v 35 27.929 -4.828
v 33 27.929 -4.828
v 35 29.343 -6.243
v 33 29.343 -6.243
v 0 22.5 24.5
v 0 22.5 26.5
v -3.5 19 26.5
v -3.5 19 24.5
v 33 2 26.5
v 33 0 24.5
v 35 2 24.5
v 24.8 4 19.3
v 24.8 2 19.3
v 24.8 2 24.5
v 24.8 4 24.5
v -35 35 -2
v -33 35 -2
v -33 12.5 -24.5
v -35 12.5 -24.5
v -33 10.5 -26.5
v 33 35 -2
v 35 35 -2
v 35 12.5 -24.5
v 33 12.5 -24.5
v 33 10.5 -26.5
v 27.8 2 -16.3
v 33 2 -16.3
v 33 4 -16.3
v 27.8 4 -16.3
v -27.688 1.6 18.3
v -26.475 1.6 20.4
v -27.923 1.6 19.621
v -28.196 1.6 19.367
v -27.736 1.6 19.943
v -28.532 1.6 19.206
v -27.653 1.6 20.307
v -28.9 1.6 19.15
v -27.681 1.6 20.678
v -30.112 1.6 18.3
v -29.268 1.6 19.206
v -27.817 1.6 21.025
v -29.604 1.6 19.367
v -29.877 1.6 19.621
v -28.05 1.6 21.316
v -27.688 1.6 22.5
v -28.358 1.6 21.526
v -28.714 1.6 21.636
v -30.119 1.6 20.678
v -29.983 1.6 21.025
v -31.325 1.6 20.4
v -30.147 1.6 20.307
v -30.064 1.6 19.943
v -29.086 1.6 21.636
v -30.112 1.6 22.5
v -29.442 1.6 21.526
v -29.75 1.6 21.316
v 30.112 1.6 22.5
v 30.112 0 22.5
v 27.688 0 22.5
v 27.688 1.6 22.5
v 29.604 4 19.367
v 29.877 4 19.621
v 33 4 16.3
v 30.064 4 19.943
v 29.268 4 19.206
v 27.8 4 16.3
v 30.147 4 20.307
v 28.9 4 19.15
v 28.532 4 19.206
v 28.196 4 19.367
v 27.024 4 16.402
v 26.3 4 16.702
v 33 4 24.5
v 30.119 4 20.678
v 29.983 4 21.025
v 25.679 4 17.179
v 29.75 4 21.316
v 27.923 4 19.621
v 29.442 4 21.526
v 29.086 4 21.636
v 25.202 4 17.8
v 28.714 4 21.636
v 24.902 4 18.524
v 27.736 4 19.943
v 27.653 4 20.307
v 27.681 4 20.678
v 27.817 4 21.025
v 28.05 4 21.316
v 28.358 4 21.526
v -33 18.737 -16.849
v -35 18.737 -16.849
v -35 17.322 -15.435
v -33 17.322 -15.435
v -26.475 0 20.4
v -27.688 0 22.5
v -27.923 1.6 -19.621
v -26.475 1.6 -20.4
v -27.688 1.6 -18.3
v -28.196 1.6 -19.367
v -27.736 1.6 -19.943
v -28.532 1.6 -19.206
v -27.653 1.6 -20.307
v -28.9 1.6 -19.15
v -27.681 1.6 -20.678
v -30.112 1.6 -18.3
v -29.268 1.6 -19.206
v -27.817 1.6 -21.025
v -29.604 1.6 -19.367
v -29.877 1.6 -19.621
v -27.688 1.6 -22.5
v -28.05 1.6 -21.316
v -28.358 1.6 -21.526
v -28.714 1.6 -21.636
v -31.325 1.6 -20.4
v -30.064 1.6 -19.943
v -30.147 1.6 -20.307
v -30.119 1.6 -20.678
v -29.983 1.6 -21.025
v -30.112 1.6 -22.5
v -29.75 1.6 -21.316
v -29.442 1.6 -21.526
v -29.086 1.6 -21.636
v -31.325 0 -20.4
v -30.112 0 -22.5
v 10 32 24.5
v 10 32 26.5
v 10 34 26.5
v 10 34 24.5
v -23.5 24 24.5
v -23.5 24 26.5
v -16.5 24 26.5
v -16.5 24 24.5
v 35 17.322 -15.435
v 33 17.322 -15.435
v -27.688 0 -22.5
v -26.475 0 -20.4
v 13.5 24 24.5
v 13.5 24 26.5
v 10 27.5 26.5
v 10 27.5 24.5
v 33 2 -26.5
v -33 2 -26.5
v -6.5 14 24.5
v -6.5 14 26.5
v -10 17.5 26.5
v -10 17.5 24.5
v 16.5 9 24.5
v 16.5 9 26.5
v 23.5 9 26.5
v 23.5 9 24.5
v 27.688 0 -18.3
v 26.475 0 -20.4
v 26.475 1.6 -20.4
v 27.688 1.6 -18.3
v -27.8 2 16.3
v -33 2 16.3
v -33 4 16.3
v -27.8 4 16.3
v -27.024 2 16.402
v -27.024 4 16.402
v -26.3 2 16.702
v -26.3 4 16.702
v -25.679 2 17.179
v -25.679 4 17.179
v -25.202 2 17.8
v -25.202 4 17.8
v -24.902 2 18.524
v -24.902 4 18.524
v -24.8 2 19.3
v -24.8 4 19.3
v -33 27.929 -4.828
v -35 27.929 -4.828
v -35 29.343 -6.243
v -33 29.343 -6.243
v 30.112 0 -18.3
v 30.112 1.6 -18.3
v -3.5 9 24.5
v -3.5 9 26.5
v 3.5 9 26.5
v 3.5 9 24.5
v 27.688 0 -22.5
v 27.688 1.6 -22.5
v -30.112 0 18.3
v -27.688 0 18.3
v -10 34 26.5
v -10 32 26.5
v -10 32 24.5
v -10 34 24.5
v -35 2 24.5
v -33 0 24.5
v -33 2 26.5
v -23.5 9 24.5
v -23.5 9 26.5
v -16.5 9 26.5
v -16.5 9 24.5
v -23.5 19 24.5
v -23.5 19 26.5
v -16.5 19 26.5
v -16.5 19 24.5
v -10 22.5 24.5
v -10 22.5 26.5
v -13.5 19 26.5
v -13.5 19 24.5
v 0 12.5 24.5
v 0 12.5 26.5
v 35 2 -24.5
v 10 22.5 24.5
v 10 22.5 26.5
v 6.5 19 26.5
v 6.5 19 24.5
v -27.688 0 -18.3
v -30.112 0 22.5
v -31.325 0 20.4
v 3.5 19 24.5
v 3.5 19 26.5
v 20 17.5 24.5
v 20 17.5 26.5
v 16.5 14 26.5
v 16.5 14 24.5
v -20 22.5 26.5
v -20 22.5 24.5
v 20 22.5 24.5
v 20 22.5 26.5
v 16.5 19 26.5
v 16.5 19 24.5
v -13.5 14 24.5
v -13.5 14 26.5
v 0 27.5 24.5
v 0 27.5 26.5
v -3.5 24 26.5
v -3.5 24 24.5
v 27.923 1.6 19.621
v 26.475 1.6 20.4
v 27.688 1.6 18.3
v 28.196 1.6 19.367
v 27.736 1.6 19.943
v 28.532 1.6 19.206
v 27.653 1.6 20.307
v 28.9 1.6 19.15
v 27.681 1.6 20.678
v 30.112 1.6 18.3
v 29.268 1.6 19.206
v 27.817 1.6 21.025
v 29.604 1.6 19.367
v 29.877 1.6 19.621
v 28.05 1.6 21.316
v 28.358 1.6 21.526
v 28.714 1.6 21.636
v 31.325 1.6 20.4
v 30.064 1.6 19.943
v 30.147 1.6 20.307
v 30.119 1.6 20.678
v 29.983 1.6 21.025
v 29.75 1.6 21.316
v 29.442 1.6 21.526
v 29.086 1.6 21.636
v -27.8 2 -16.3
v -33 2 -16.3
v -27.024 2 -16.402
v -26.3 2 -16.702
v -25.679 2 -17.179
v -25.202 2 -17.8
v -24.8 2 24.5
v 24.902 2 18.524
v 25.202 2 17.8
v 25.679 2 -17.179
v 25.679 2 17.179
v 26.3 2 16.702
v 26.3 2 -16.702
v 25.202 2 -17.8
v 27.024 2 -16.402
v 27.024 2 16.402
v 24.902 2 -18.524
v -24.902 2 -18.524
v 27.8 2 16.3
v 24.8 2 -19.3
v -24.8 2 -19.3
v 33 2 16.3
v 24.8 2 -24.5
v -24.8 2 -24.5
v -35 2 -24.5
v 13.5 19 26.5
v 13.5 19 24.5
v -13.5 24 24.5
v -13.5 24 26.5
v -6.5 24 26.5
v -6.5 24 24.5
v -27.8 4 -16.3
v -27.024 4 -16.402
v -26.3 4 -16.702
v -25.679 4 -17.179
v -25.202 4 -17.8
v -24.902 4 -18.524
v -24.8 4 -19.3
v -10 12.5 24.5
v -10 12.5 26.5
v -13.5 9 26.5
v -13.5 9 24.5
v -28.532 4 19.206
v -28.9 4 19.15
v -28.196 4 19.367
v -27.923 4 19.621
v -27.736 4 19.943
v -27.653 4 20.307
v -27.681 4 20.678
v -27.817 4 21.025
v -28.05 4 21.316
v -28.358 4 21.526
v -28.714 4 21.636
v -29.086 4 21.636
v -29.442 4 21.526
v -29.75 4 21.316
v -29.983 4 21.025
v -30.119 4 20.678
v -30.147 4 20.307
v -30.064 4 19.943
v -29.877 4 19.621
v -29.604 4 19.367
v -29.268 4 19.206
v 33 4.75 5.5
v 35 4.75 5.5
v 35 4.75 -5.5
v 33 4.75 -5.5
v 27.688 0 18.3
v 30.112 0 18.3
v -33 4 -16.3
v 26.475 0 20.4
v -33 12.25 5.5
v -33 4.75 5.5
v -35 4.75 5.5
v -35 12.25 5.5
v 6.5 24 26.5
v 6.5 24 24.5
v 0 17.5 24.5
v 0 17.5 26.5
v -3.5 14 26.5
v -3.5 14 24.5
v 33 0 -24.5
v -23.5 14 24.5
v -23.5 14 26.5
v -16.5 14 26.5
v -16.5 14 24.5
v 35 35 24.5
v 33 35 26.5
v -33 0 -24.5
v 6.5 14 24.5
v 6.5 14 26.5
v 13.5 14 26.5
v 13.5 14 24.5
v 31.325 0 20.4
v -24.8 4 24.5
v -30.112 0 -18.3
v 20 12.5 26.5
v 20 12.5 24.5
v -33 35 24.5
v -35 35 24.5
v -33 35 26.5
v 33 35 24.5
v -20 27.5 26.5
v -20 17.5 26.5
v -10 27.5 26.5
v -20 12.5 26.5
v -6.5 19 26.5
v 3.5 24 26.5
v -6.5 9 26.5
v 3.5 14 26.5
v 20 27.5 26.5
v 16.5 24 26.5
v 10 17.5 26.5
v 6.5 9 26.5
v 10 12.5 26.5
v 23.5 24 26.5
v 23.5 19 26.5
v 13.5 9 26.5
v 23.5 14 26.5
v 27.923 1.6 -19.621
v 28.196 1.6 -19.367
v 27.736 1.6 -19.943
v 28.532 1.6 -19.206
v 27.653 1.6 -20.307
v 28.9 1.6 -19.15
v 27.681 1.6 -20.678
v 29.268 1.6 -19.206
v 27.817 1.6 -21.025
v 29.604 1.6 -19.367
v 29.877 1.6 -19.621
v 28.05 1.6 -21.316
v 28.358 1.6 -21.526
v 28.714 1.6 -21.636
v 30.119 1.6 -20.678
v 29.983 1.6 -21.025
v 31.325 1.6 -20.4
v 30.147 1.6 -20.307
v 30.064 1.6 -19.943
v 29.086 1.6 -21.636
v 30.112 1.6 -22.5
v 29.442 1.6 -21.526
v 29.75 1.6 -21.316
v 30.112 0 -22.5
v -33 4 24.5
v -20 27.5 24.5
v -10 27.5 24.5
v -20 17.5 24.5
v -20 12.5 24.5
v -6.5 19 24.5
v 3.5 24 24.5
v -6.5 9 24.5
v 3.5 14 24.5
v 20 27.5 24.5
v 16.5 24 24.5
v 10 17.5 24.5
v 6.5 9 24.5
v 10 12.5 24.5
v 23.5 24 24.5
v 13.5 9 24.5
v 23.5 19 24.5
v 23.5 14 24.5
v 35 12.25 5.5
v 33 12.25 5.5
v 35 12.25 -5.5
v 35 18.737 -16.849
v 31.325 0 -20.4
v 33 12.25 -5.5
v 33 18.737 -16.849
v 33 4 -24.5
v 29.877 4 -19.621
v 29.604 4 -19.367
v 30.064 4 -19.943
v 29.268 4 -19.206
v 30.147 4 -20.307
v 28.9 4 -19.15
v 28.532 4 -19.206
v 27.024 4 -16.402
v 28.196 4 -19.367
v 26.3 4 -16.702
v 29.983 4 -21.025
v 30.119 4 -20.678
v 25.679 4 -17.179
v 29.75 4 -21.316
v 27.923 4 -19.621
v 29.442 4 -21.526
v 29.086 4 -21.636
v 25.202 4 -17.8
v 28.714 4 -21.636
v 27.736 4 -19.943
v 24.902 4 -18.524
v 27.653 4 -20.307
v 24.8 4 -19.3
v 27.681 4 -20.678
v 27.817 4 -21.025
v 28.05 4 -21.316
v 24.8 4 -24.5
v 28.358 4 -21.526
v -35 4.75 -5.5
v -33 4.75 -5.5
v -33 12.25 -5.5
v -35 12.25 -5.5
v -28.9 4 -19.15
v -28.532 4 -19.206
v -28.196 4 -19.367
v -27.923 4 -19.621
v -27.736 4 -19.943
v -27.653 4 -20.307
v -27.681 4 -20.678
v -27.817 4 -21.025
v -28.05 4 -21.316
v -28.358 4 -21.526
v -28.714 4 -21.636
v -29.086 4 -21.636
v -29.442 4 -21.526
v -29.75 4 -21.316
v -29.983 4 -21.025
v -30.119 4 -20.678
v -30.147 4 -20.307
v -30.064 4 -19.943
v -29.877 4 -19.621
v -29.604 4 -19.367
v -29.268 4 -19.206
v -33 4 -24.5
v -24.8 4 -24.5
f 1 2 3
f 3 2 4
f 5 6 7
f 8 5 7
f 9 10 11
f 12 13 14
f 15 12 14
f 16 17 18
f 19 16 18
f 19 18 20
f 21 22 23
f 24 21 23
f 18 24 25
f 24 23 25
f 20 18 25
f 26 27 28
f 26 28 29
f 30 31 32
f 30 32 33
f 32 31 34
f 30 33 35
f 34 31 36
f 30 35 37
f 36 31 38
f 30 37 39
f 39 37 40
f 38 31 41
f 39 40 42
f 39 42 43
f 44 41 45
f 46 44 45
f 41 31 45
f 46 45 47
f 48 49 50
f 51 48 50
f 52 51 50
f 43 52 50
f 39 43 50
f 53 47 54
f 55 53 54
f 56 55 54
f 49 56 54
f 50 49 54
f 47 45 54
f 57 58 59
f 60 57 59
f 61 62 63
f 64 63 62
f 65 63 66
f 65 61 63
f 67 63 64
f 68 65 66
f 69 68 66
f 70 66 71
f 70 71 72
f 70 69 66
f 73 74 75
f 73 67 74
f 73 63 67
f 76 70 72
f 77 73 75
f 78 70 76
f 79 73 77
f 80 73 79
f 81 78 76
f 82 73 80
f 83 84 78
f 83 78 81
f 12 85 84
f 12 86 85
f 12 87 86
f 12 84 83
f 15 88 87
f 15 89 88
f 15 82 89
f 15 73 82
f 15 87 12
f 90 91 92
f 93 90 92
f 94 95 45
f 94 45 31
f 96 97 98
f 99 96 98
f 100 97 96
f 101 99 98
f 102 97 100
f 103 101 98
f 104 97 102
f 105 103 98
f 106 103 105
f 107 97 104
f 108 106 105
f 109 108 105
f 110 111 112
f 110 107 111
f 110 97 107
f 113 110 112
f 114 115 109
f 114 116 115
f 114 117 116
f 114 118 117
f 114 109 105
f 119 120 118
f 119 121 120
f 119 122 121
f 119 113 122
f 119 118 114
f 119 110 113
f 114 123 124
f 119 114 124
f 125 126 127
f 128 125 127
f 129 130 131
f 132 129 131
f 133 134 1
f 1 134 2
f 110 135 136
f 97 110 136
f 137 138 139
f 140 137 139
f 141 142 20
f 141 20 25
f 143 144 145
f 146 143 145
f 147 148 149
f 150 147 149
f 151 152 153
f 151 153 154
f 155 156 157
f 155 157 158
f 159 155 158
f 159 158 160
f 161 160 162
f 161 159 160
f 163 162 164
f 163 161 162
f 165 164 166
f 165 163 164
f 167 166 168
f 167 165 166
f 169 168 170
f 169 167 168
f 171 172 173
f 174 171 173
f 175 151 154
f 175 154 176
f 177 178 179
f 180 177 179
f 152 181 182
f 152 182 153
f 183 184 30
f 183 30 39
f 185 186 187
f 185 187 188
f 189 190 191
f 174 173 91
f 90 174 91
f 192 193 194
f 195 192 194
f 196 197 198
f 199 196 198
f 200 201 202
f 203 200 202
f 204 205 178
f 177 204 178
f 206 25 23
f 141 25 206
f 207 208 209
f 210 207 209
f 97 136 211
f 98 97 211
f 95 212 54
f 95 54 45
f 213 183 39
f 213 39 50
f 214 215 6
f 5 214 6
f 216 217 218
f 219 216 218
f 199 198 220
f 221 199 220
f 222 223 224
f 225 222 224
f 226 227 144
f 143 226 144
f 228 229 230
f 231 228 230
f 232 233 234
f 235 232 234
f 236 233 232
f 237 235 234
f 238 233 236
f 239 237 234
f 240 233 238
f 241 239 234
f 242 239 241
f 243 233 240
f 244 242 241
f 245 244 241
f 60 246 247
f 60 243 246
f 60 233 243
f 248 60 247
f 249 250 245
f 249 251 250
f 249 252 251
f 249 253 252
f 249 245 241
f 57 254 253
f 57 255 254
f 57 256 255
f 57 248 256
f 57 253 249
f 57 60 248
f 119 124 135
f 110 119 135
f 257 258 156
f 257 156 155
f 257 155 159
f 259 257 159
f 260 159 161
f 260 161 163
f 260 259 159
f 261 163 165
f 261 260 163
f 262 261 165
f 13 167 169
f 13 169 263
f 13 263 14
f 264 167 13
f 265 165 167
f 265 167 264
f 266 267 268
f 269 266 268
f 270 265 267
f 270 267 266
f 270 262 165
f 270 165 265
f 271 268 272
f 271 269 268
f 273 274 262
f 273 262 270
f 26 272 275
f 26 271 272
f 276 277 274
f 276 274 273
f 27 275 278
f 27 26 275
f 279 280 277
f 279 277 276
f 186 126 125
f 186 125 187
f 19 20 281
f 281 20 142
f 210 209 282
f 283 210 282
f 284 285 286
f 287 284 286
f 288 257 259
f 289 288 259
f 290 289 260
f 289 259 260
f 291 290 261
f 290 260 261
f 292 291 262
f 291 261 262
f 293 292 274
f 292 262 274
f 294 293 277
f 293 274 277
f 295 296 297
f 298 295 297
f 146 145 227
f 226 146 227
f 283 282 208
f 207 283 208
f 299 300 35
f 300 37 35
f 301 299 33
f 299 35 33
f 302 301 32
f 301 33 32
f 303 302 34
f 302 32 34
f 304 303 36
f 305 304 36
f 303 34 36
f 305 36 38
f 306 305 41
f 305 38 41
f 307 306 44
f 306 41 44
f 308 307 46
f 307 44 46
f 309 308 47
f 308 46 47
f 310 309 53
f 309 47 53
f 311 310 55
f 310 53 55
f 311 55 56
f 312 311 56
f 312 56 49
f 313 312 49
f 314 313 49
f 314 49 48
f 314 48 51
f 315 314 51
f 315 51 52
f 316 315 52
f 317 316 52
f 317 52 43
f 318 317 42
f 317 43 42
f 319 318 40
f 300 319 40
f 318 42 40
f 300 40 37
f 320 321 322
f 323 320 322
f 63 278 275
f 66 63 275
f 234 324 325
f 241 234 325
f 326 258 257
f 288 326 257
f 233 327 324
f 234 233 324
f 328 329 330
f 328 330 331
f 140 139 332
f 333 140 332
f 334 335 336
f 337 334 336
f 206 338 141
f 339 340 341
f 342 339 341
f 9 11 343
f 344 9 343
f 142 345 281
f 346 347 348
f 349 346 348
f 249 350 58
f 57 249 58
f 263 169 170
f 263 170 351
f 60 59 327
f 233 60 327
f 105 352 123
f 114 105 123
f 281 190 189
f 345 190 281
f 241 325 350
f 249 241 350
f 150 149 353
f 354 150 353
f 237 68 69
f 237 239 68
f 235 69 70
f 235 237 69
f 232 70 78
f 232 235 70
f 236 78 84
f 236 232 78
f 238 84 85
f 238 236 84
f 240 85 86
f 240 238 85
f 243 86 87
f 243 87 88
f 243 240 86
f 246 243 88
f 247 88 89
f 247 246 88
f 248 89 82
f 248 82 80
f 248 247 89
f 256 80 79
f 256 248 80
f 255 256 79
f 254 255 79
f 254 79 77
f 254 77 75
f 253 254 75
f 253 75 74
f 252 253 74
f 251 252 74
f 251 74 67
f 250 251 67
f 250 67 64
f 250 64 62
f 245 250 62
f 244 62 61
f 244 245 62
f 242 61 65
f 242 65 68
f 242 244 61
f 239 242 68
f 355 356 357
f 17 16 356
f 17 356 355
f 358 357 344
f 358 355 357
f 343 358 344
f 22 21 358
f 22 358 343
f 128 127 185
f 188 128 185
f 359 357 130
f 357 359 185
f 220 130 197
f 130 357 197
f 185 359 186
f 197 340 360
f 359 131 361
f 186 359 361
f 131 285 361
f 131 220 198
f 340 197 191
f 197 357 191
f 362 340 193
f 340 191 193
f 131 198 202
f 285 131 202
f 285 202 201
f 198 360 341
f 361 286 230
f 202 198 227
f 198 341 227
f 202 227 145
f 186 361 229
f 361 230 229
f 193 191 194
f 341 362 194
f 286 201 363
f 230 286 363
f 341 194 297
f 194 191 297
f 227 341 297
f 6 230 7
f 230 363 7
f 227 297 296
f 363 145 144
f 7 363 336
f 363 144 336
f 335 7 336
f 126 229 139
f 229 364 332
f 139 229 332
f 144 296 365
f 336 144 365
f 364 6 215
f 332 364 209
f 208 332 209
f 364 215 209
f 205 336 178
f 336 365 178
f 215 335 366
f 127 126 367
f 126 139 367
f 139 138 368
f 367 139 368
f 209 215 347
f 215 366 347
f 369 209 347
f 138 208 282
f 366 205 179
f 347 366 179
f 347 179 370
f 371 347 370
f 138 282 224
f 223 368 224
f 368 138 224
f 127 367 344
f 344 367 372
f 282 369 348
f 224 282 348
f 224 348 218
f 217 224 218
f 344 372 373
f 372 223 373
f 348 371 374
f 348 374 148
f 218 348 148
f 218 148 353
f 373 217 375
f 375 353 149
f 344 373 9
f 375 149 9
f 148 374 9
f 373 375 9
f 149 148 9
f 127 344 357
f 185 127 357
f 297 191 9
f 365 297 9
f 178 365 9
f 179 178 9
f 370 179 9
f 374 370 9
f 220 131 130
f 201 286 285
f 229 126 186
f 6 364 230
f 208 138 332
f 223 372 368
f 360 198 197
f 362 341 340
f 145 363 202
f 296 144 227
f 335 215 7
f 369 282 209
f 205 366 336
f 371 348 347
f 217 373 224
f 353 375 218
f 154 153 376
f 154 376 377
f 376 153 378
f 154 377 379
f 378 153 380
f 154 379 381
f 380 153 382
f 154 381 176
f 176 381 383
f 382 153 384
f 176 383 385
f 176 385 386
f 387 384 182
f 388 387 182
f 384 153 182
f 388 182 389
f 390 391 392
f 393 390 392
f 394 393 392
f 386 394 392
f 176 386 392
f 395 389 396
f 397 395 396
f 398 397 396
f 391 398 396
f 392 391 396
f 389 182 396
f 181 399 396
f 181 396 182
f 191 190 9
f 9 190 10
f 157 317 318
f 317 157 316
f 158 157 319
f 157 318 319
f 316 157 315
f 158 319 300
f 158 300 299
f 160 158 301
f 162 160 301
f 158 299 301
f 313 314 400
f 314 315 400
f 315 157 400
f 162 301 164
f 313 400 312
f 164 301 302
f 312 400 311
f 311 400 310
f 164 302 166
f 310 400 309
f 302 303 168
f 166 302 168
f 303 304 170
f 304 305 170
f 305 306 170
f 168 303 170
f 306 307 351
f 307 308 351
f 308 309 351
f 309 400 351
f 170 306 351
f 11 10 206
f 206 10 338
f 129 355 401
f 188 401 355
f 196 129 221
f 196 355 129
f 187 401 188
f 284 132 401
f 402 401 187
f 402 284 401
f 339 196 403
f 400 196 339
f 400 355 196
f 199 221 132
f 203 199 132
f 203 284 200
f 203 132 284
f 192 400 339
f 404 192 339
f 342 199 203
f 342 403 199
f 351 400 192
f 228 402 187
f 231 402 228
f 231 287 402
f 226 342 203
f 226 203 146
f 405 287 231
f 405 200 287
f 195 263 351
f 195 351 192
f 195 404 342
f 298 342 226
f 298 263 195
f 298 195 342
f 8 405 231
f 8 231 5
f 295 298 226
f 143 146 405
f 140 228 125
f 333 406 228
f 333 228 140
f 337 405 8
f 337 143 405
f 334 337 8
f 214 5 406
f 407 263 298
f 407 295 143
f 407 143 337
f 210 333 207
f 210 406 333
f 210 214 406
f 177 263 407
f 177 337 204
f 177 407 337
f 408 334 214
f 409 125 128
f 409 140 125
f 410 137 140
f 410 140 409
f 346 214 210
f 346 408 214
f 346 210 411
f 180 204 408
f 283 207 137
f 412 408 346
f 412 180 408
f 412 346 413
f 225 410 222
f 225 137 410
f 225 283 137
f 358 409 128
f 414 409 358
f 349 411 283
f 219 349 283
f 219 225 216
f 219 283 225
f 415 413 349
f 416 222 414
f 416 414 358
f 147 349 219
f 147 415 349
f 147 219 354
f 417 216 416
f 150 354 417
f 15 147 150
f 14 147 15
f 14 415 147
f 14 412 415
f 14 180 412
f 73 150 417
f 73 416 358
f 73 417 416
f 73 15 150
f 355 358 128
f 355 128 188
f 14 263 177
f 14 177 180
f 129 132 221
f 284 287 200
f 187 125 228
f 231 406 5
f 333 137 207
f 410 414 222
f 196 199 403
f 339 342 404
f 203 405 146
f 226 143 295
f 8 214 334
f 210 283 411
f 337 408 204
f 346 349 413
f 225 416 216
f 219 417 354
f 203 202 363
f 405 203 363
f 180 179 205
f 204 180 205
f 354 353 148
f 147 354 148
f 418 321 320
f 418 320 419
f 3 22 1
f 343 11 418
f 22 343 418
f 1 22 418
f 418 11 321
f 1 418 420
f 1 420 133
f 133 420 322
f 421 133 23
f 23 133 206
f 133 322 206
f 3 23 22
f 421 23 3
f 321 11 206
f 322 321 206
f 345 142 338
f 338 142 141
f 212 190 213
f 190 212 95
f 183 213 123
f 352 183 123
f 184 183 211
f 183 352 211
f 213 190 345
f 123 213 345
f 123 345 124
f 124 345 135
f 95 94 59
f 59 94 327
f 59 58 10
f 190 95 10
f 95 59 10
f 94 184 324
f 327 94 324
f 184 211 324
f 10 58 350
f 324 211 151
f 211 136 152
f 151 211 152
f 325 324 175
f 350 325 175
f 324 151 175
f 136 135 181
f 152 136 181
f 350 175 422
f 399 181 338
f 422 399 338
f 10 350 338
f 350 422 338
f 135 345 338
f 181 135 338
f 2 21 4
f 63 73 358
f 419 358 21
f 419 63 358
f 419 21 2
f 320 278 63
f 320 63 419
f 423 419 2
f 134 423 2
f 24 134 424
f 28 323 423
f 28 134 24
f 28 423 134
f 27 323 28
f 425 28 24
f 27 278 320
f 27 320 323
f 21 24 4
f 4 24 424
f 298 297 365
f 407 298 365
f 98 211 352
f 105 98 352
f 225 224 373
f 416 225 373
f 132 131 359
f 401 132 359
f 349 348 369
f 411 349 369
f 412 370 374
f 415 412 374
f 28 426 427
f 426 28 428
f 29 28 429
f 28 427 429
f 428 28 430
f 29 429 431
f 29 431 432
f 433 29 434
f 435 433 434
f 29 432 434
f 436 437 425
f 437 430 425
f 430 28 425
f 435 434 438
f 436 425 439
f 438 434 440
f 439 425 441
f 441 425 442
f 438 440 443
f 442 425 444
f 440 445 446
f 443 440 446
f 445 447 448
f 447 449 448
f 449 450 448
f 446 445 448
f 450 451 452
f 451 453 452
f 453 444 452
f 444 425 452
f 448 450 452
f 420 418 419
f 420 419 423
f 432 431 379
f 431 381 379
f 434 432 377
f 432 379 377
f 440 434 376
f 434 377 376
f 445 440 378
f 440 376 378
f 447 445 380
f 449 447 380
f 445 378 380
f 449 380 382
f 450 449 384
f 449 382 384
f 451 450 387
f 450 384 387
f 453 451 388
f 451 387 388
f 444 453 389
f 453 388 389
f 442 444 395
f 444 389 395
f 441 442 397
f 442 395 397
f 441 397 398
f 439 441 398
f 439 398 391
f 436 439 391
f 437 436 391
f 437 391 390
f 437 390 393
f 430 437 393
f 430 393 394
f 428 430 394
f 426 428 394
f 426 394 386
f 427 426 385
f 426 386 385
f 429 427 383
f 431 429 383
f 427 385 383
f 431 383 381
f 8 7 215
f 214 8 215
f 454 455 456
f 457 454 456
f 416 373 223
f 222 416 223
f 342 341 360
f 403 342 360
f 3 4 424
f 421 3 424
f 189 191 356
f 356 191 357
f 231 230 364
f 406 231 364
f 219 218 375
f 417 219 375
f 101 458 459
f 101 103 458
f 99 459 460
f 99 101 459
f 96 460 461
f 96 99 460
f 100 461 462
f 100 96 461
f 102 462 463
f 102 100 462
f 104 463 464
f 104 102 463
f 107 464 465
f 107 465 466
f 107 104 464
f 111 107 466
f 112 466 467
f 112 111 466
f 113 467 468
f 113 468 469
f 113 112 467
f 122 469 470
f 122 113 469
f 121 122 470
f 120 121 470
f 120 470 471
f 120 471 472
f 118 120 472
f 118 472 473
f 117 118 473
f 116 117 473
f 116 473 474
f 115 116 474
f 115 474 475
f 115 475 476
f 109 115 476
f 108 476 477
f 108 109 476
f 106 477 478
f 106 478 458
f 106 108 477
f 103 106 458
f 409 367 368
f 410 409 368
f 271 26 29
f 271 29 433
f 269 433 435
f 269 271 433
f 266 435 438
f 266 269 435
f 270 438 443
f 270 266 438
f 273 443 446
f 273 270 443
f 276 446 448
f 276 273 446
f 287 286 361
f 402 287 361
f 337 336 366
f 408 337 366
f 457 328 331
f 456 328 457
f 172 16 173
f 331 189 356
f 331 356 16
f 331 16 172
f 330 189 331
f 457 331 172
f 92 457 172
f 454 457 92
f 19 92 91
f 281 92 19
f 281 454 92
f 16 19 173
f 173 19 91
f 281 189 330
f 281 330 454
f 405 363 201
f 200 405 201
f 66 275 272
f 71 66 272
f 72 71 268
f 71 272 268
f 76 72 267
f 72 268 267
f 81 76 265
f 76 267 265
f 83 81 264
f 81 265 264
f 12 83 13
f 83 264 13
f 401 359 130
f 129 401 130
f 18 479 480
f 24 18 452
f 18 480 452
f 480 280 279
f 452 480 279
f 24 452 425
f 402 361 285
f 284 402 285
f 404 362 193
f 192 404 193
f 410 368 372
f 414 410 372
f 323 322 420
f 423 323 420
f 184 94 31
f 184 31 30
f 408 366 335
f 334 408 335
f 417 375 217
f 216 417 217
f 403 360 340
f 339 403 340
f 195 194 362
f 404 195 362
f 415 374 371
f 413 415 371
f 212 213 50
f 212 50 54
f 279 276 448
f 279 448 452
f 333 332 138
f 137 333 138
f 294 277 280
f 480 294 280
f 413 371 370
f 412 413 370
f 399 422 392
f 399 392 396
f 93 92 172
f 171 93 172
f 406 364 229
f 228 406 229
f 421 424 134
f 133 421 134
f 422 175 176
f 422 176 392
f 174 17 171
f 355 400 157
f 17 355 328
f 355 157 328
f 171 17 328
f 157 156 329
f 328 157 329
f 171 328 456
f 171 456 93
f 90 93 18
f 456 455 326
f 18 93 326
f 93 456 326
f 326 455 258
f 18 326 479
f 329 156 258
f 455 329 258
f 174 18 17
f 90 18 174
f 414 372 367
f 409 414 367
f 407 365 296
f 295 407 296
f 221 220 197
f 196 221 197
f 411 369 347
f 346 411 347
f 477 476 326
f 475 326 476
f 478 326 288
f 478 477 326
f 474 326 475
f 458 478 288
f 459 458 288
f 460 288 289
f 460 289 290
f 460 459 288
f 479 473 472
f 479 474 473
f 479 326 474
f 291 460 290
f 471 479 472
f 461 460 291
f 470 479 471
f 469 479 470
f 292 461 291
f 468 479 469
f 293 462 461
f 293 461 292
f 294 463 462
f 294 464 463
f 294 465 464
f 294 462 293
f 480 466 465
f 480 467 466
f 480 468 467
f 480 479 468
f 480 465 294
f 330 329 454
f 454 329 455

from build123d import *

# Parameters (mm, degrees)
SKETCH1_W               = 70
SKETCH1_H               = 53
SKETCH1_W_2             = 66
SKETCH1_H_2             = 49
BOSS_EXTRUDE1_DEPTH     = 2
BOSS_EXTRUDE2_START     = 2
SKETCH1_3_W             = 70
SKETCH1_3_H             = 53
SKETCH1_3_W_2           = 66
SKETCH1_3_H_2           = 49
BOSS_EXTRUDE2_DEPTH     = 33
CHAMFER1_SIZE           = 2
SKETCH2_R               = 1.25
BOSS_EXTRUDE3_DEPTH     = 2
MIRROR2_COPY_1_SKETCH_R = 1.25
MIRROR2_COPY_1_DEPTH    = 2
CUT_EXTRUDE1_DEPTH      = 1.6
MIRROR4_COPY_1_DEPTH    = 1.6
CUT_EXTRUDE2_DEPTH      = 55.92039694
CUT_EXTRUDE2_DEPTH_BACK = 55.92039694
SKETCH4_R               = 1.25
SKETCH7_W               = 11
SKETCH7_H               = 7.5
CUT_EXTRUDE5_DEPTH      = 83.627174707
CUT_EXTRUDE3_DEPTH      = 72.070387645
CUT_EXTRUDE3_DEPTH_BACK = 72.070387645
SKETCH5_W               = 20
SKETCH5_H               = 2
CUT_EXTRUDE8_DEPTH      = 83.627174707
CUT_EXTRUDE4_DEPTH      = 81.939792439
CUT_EXTRUDE4_DEPTH_BACK = 81.939792439
CUT_EXTRUDE9_REACH      = 74.519
LPATTERN2_COUNT         = 3
LPATTERN2_PITCH         = 10
LPATTERN2_COL_COUNT     = 3
LPATTERN2_COL_PITCH     = 10
LPATTERN3_COUNT         = 4
LPATTERN3_PITCH         = 5
LPATTERN3_COPY_1_REACH  = 74.519
LPATTERN3_COPY_2_REACH  = 74.519
LPATTERN3_COPY_3_REACH  = 74.519
LPATTERN3_COPY_4_REACH  = 74.519
LPATTERN3_COPY_5_REACH  = 74.519
LPATTERN3_COPY_6_REACH  = 74.519
LPATTERN3_COPY_7_REACH  = 74.519
LPATTERN3_COPY_8_REACH  = 74.519
LPATTERN3_COPY_9_REACH  = 74.519
LPATTERN3_COPY_10_REACH = 74.519
LPATTERN3_COPY_11_REACH = 74.519
LPATTERN3_COPY_12_REACH = 74.519


with BuildPart() as part:
    # Sketch1 → Boss-Extrude1 (new body)
    # profile 1 of 2: a face of its own
    with BuildSketch(Plane(origin=(0, 0, 0), x_dir=(1, 0, 0), z_dir=(0, 1, 0))):
        Rectangle(SKETCH1_W, SKETCH1_H)
        Rectangle(SKETCH1_W_2, SKETCH1_H_2, mode=Mode.SUBTRACT)
    # profile 2 of 2: a face of its own
    with BuildSketch(Plane(origin=(0, 0, 0), x_dir=(1, 0, 0), z_dir=(0, 1, 0))):
        Rectangle(SKETCH1_W_2, SKETCH1_H_2)
    extrude(amount=BOSS_EXTRUDE1_DEPTH)

    # Sketch1<3> → Boss-Extrude2 (add)
    with BuildSketch(Plane(origin=(0, 0, 0), x_dir=(1, 0, 0), z_dir=(0, 1, 0)).offset(BOSS_EXTRUDE2_START)):
        Rectangle(SKETCH1_3_W, SKETCH1_3_H)
        Rectangle(SKETCH1_3_W_2, SKETCH1_3_H_2, mode=Mode.SUBTRACT)
    extrude(amount=BOSS_EXTRUDE2_DEPTH)

    # Chamfer1
    chamfer1_edges = [part.edges().sort_by_distance(p)[0] for p in [
        (0, 0, -26.5),
        (35, 0, 0),
        (0, 0, 26.5),
        (-35, 0, 0),
        (-35, 17.5, -26.5),
        (35, 17.5, -26.5),
        (35, 17.5, 26.5),
        (-35, 17.5, 26.5),
    ]]
    chamfer(chamfer1_edges, length=CHAMFER1_SIZE)

    # Sketch2 → Boss-Extrude3 (add)
    with BuildSketch(Plane(origin=(0, 2, 0), x_dir=(1, 0, 0), z_dir=(0, 1, 0))):
        with BuildLine():
            Line((-33, 16.3), (-27.8, 16.3))
            ThreePointArc((-27.8, 16.3), (-25.678679656, 17.178679656), (-24.8, 19.3))
            Line((-24.8, 19.3), (-24.8, 24.5))
            Line((-24.8, 24.5), (-33, 24.5))
            Line((-33, 24.5), (-33, 16.3))
        make_face()
        with Locations(Location((-28.9, 20.4, 0), (0, 0, 270))):
            Circle(SKETCH2_R, mode=Mode.SUBTRACT)
    boss_extrude3 = extrude(amount=BOSS_EXTRUDE3_DEPTH)

    # Mirror1: Boss-Extrude3 across plane
    add(boss_extrude3.mirror(Plane.XY))

    # Mirror2: Boss-Extrude3 across plane
    add(boss_extrude3.mirror(Plane(origin=(0, 0, 0), x_dir=(0, 0, 1), z_dir=(1, 0, 0))))

    # Mirror2 copy 1 sketch → Mirror2 copy 1 (add)
    with BuildSketch(Plane(origin=(0, 2, 0), x_dir=(-1, 0, 0), z_dir=(0, 1, 0))):
        with BuildLine():
            Line((-33, 16.3), (-27.8, 16.3))
            ThreePointArc((-27.8, 16.3), (-25.678679656, 17.178679656), (-24.8, 19.3))
            Line((-24.8, 19.3), (-24.8, 24.5))
            Line((-24.8, 24.5), (-33, 24.5))
            Line((-33, 24.5), (-33, 16.3))
        make_face()
        with Locations(Location((-28.9, 20.4, 0), (0, 0, 270))):
            Circle(MIRROR2_COPY_1_SKETCH_R, mode=Mode.SUBTRACT)
    extrude(amount=MIRROR2_COPY_1_DEPTH)

    # Sketch3 → Cut-Extrude1 (cut)
    with BuildSketch(Plane.XZ):
        Polygon((-30.112435565, 22.5), (-27.687564435, 22.5), (-26.475128869, 20.4), (-27.687564435, 18.3), (-30.112435565, 18.3), (-31.324871131, 20.4), align=None)
    cut_extrude1 = extrude(amount=-CUT_EXTRUDE1_DEPTH, mode=Mode.SUBTRACT)

    # Mirror3: Cut-Extrude1 across plane
    add(cut_extrude1.mirror(Plane.XY), mode=Mode.SUBTRACT)

    # Mirror4: Cut-Extrude1 across plane
    add(cut_extrude1.mirror(Plane(origin=(0, 0, 0), x_dir=(0, 0, 1), z_dir=(1, 0, 0))), mode=Mode.SUBTRACT)

    # Mirror4 copy 1 sketch → Mirror4 copy 1 (cut)
    with BuildSketch(Plane(origin=(0, 0, 0), x_dir=(-1, 0, 0), z_dir=(0, -1, 0))):
        Polygon((-30.112435565, 22.5), (-27.687564435, 22.5), (-26.475128869, 20.4), (-27.687564435, 18.3), (-30.112435565, 18.3), (-31.324871131, 20.4), align=None)
    extrude(amount=-MIRROR4_COPY_1_DEPTH, mode=Mode.SUBTRACT)

    # Sketch4 → Cut-Extrude2 (cut, two sides: drawn at the far end of the back side and taken through both)
    with BuildSketch(Plane(origin=(0, 2, 0), x_dir=(1, 0, 0), z_dir=(0, 1, 0)).offset(-CUT_EXTRUDE2_DEPTH_BACK)):
        with Locations(Location((28.9, -20.4, 0), (0, 0, 90))):
            Circle(SKETCH4_R)
        with Locations(Location((28.9, 20.4, 0), (0, 0, 270))):
            Circle(SKETCH4_R)
        with Locations(Location((-28.9, 20.4, 0), (0, 0, 270))):
            Circle(SKETCH4_R)
        with Locations(Location((-28.9, -20.4, 0), (0, 0, 90))):
            Circle(SKETCH4_R)
    extrude(amount=CUT_EXTRUDE2_DEPTH + CUT_EXTRUDE2_DEPTH_BACK, mode=Mode.SUBTRACT)

    # Sketch7 → Cut-Extrude5 (cut, through all)
    with BuildSketch(Plane(origin=(35, 0, 0), x_dir=(0, 0, -1), z_dir=(1, 0, 0))):
        with Locations((0, 8.5)):
            Rectangle(SKETCH7_W, SKETCH7_H)
    extrude(amount=-CUT_EXTRUDE5_DEPTH, mode=Mode.SUBTRACT)

    # Sketch5 → Cut-Extrude3 (cut, two sides: drawn at the far end of the back side and taken through both)
    with BuildSketch(Plane(origin=(0, 0, 24.5), x_dir=(-1, 0, 0), z_dir=(0, 0, -1)).offset(-CUT_EXTRUDE3_DEPTH_BACK)):
        with Locations((0, 33)):
            Rectangle(SKETCH5_W, SKETCH5_H)
    extrude(amount=CUT_EXTRUDE3_DEPTH + CUT_EXTRUDE3_DEPTH_BACK, mode=Mode.SUBTRACT)

    # Sketch9 → Cut-Extrude8 (cut, through all)
    with BuildSketch(Plane(origin=(35, 0, 0), x_dir=(0, 0, -1), z_dir=(1, 0, 0))):
        Polygon((2, 35), (26.5, 10.5), (26.5, 35), align=None)
    extrude(amount=-CUT_EXTRUDE8_DEPTH, mode=Mode.SUBTRACT)

    # Sketch6 → Cut-Extrude4 (cut, two sides: drawn at the far end of the back side and taken through both)
    with BuildSketch(Plane(origin=(-33, 0, 0), x_dir=(0, 0, -1), z_dir=(1, 0, 0)).offset(-CUT_EXTRUDE4_DEPTH_BACK)):
        Polygon((6.242640687, 29.343145751), (16.849242405, 18.736544033), (15.435028843, 17.32233047), (4.828427125, 27.928932188), align=None)
    extrude(amount=CUT_EXTRUDE4_DEPTH + CUT_EXTRUDE4_DEPTH_BACK, mode=Mode.SUBTRACT)

    # Sketch11 → Cut-Extrude9 (cut, up to next)
    with BuildSketch(Plane.XY.offset(26.5), mode=Mode.PRIVATE) as cut_extrude9_sk1:
        Polygon((0, 27.5), (-3.5, 24), (3.5, 24), align=None)
    cut_extrude9_tool1 = extrude(cut_extrude9_sk1.sketch, amount=-CUT_EXTRUDE9_REACH, mode=Mode.PRIVATE) & part.part
    cut_extrude9 = cut_extrude9_tool1.solids().sort_by_distance((0, 25.166667, 26.5))[0]
    add(cut_extrude9, mode=Mode.SUBTRACT)

    # LPattern2: Cut-Extrude9 ×3
    with Locations(*[(i * LPATTERN2_PITCH, 0, 0) for i in range(1, LPATTERN2_COUNT)]):
        add(cut_extrude9, mode=Mode.SUBTRACT)

    # LPattern2 col: Cut-Extrude9 ×3
    with Locations(*[(-i * LPATTERN2_COL_PITCH, 0, 0) for i in range(1, LPATTERN2_COL_COUNT)]):
        add(cut_extrude9, mode=Mode.SUBTRACT)

    # LPattern3: Cut-Extrude9 ×4
    with Locations(*[(0, -i * LPATTERN3_PITCH, 0) for i in range(1, LPATTERN3_COUNT)]):
        add(cut_extrude9, mode=Mode.SUBTRACT)

    # LPattern3 copy 1 sketch → LPattern3 copy 1 (cut, up to next)
    with BuildSketch(Plane(origin=(10, -5, 26.5), x_dir=(1, 0, 0), z_dir=(0, 0, 1)), mode=Mode.PRIVATE) as lpattern3_copy_1_sk1:
        Polygon((0, 27.5), (-3.5, 24), (3.5, 24), align=None)
    lpattern3_copy_1_tool1 = extrude(lpattern3_copy_1_sk1.sketch, amount=-LPATTERN3_COPY_1_REACH, mode=Mode.PRIVATE) & part.part
    add(lpattern3_copy_1_tool1.solids().sort_by_distance((10, 20.166667, 26.5))[0], mode=Mode.SUBTRACT)

    # LPattern3 copy 2 sketch → LPattern3 copy 2 (cut, up to next)
    with BuildSketch(Plane(origin=(10, -10, 26.5), x_dir=(1, 0, 0), z_dir=(0, 0, 1)), mode=Mode.PRIVATE) as lpattern3_copy_2_sk1:
        Polygon((0, 27.5), (-3.5, 24), (3.5, 24), align=None)
    lpattern3_copy_2_tool1 = extrude(lpattern3_copy_2_sk1.sketch, amount=-LPATTERN3_COPY_2_REACH, mode=Mode.PRIVATE) & part.part
    add(lpattern3_copy_2_tool1.solids().sort_by_distance((10, 15.166667, 26.5))[0], mode=Mode.SUBTRACT)

    # LPattern3 copy 3 sketch → LPattern3 copy 3 (cut, up to next)
    with BuildSketch(Plane(origin=(10, -15, 26.5), x_dir=(1, 0, 0), z_dir=(0, 0, 1)), mode=Mode.PRIVATE) as lpattern3_copy_3_sk1:
        Polygon((0, 27.5), (-3.5, 24), (3.5, 24), align=None)
    lpattern3_copy_3_tool1 = extrude(lpattern3_copy_3_sk1.sketch, amount=-LPATTERN3_COPY_3_REACH, mode=Mode.PRIVATE) & part.part
    add(lpattern3_copy_3_tool1.solids().sort_by_distance((10, 10.166667, 26.5))[0], mode=Mode.SUBTRACT)

    # LPattern3 copy 4 sketch → LPattern3 copy 4 (cut, up to next)
    with BuildSketch(Plane(origin=(20, -5, 26.5), x_dir=(1, 0, 0), z_dir=(0, 0, 1)), mode=Mode.PRIVATE) as lpattern3_copy_4_sk1:
        Polygon((0, 27.5), (-3.5, 24), (3.5, 24), align=None)
    lpattern3_copy_4_tool1 = extrude(lpattern3_copy_4_sk1.sketch, amount=-LPATTERN3_COPY_4_REACH, mode=Mode.PRIVATE) & part.part
    add(lpattern3_copy_4_tool1.solids().sort_by_distance((20, 20.166667, 26.5))[0], mode=Mode.SUBTRACT)

    # LPattern3 copy 5 sketch → LPattern3 copy 5 (cut, up to next)
    with BuildSketch(Plane(origin=(20, -10, 26.5), x_dir=(1, 0, 0), z_dir=(0, 0, 1)), mode=Mode.PRIVATE) as lpattern3_copy_5_sk1:
        Polygon((0, 27.5), (-3.5, 24), (3.5, 24), align=None)
    lpattern3_copy_5_tool1 = extrude(lpattern3_copy_5_sk1.sketch, amount=-LPATTERN3_COPY_5_REACH, mode=Mode.PRIVATE) & part.part
    add(lpattern3_copy_5_tool1.solids().sort_by_distance((20, 15.166667, 26.5))[0], mode=Mode.SUBTRACT)

    # LPattern3 copy 6 sketch → LPattern3 copy 6 (cut, up to next)
    with BuildSketch(Plane(origin=(20, -15, 26.5), x_dir=(1, 0, 0), z_dir=(0, 0, 1)), mode=Mode.PRIVATE) as lpattern3_copy_6_sk1:
        Polygon((0, 27.5), (-3.5, 24), (3.5, 24), align=None)
    lpattern3_copy_6_tool1 = extrude(lpattern3_copy_6_sk1.sketch, amount=-LPATTERN3_COPY_6_REACH, mode=Mode.PRIVATE) & part.part
    add(lpattern3_copy_6_tool1.solids().sort_by_distance((20, 10.166667, 26.5))[0], mode=Mode.SUBTRACT)

    # LPattern3 copy 7 sketch → LPattern3 copy 7 (cut, up to next)
    with BuildSketch(Plane(origin=(-10, -5, 26.5), x_dir=(1, 0, 0), z_dir=(0, 0, 1)), mode=Mode.PRIVATE) as lpattern3_copy_7_sk1:
        Polygon((0, 27.5), (-3.5, 24), (3.5, 24), align=None)
    lpattern3_copy_7_tool1 = extrude(lpattern3_copy_7_sk1.sketch, amount=-LPATTERN3_COPY_7_REACH, mode=Mode.PRIVATE) & part.part
    add(lpattern3_copy_7_tool1.solids().sort_by_distance((-10, 20.166667, 26.5))[0], mode=Mode.SUBTRACT)

    # LPattern3 copy 8 sketch → LPattern3 copy 8 (cut, up to next)
    with BuildSketch(Plane(origin=(-10, -10, 26.5), x_dir=(1, 0, 0), z_dir=(0, 0, 1)), mode=Mode.PRIVATE) as lpattern3_copy_8_sk1:
        Polygon((0, 27.5), (-3.5, 24), (3.5, 24), align=None)
    lpattern3_copy_8_tool1 = extrude(lpattern3_copy_8_sk1.sketch, amount=-LPATTERN3_COPY_8_REACH, mode=Mode.PRIVATE) & part.part
    add(lpattern3_copy_8_tool1.solids().sort_by_distance((-10, 15.166667, 26.5))[0], mode=Mode.SUBTRACT)

    # LPattern3 copy 9 sketch → LPattern3 copy 9 (cut, up to next)
    with BuildSketch(Plane(origin=(-10, -15, 26.5), x_dir=(1, 0, 0), z_dir=(0, 0, 1)), mode=Mode.PRIVATE) as lpattern3_copy_9_sk1:
        Polygon((0, 27.5), (-3.5, 24), (3.5, 24), align=None)
    lpattern3_copy_9_tool1 = extrude(lpattern3_copy_9_sk1.sketch, amount=-LPATTERN3_COPY_9_REACH, mode=Mode.PRIVATE) & part.part
    add(lpattern3_copy_9_tool1.solids().sort_by_distance((-10, 10.166667, 26.5))[0], mode=Mode.SUBTRACT)

    # LPattern3 copy 10 sketch → LPattern3 copy 10 (cut, up to next)
    with BuildSketch(Plane(origin=(-20, -5, 26.5), x_dir=(1, 0, 0), z_dir=(0, 0, 1)), mode=Mode.PRIVATE) as lpattern3_copy_10_sk1:
        Polygon((0, 27.5), (-3.5, 24), (3.5, 24), align=None)
    lpattern3_copy_10_tool1 = extrude(lpattern3_copy_10_sk1.sketch, amount=-LPATTERN3_COPY_10_REACH, mode=Mode.PRIVATE) & part.part
    add(lpattern3_copy_10_tool1.solids().sort_by_distance((-20, 20.166667, 26.5))[0], mode=Mode.SUBTRACT)

    # LPattern3 copy 11 sketch → LPattern3 copy 11 (cut, up to next)
    with BuildSketch(Plane(origin=(-20, -10, 26.5), x_dir=(1, 0, 0), z_dir=(0, 0, 1)), mode=Mode.PRIVATE) as lpattern3_copy_11_sk1:
        Polygon((0, 27.5), (-3.5, 24), (3.5, 24), align=None)
    lpattern3_copy_11_tool1 = extrude(lpattern3_copy_11_sk1.sketch, amount=-LPATTERN3_COPY_11_REACH, mode=Mode.PRIVATE) & part.part
    add(lpattern3_copy_11_tool1.solids().sort_by_distance((-20, 15.166667, 26.5))[0], mode=Mode.SUBTRACT)

    # LPattern3 copy 12 sketch → LPattern3 copy 12 (cut, up to next)
    with BuildSketch(Plane(origin=(-20, -15, 26.5), x_dir=(1, 0, 0), z_dir=(0, 0, 1)), mode=Mode.PRIVATE) as lpattern3_copy_12_sk1:
        Polygon((0, 27.5), (-3.5, 24), (3.5, 24), align=None)
    lpattern3_copy_12_tool1 = extrude(lpattern3_copy_12_sk1.sketch, amount=-LPATTERN3_COPY_12_REACH, mode=Mode.PRIVATE) & part.part
    add(lpattern3_copy_12_tool1.solids().sort_by_distance((-20, 10.166667, 26.5))[0], mode=Mode.SUBTRACT)


solid = part.part
